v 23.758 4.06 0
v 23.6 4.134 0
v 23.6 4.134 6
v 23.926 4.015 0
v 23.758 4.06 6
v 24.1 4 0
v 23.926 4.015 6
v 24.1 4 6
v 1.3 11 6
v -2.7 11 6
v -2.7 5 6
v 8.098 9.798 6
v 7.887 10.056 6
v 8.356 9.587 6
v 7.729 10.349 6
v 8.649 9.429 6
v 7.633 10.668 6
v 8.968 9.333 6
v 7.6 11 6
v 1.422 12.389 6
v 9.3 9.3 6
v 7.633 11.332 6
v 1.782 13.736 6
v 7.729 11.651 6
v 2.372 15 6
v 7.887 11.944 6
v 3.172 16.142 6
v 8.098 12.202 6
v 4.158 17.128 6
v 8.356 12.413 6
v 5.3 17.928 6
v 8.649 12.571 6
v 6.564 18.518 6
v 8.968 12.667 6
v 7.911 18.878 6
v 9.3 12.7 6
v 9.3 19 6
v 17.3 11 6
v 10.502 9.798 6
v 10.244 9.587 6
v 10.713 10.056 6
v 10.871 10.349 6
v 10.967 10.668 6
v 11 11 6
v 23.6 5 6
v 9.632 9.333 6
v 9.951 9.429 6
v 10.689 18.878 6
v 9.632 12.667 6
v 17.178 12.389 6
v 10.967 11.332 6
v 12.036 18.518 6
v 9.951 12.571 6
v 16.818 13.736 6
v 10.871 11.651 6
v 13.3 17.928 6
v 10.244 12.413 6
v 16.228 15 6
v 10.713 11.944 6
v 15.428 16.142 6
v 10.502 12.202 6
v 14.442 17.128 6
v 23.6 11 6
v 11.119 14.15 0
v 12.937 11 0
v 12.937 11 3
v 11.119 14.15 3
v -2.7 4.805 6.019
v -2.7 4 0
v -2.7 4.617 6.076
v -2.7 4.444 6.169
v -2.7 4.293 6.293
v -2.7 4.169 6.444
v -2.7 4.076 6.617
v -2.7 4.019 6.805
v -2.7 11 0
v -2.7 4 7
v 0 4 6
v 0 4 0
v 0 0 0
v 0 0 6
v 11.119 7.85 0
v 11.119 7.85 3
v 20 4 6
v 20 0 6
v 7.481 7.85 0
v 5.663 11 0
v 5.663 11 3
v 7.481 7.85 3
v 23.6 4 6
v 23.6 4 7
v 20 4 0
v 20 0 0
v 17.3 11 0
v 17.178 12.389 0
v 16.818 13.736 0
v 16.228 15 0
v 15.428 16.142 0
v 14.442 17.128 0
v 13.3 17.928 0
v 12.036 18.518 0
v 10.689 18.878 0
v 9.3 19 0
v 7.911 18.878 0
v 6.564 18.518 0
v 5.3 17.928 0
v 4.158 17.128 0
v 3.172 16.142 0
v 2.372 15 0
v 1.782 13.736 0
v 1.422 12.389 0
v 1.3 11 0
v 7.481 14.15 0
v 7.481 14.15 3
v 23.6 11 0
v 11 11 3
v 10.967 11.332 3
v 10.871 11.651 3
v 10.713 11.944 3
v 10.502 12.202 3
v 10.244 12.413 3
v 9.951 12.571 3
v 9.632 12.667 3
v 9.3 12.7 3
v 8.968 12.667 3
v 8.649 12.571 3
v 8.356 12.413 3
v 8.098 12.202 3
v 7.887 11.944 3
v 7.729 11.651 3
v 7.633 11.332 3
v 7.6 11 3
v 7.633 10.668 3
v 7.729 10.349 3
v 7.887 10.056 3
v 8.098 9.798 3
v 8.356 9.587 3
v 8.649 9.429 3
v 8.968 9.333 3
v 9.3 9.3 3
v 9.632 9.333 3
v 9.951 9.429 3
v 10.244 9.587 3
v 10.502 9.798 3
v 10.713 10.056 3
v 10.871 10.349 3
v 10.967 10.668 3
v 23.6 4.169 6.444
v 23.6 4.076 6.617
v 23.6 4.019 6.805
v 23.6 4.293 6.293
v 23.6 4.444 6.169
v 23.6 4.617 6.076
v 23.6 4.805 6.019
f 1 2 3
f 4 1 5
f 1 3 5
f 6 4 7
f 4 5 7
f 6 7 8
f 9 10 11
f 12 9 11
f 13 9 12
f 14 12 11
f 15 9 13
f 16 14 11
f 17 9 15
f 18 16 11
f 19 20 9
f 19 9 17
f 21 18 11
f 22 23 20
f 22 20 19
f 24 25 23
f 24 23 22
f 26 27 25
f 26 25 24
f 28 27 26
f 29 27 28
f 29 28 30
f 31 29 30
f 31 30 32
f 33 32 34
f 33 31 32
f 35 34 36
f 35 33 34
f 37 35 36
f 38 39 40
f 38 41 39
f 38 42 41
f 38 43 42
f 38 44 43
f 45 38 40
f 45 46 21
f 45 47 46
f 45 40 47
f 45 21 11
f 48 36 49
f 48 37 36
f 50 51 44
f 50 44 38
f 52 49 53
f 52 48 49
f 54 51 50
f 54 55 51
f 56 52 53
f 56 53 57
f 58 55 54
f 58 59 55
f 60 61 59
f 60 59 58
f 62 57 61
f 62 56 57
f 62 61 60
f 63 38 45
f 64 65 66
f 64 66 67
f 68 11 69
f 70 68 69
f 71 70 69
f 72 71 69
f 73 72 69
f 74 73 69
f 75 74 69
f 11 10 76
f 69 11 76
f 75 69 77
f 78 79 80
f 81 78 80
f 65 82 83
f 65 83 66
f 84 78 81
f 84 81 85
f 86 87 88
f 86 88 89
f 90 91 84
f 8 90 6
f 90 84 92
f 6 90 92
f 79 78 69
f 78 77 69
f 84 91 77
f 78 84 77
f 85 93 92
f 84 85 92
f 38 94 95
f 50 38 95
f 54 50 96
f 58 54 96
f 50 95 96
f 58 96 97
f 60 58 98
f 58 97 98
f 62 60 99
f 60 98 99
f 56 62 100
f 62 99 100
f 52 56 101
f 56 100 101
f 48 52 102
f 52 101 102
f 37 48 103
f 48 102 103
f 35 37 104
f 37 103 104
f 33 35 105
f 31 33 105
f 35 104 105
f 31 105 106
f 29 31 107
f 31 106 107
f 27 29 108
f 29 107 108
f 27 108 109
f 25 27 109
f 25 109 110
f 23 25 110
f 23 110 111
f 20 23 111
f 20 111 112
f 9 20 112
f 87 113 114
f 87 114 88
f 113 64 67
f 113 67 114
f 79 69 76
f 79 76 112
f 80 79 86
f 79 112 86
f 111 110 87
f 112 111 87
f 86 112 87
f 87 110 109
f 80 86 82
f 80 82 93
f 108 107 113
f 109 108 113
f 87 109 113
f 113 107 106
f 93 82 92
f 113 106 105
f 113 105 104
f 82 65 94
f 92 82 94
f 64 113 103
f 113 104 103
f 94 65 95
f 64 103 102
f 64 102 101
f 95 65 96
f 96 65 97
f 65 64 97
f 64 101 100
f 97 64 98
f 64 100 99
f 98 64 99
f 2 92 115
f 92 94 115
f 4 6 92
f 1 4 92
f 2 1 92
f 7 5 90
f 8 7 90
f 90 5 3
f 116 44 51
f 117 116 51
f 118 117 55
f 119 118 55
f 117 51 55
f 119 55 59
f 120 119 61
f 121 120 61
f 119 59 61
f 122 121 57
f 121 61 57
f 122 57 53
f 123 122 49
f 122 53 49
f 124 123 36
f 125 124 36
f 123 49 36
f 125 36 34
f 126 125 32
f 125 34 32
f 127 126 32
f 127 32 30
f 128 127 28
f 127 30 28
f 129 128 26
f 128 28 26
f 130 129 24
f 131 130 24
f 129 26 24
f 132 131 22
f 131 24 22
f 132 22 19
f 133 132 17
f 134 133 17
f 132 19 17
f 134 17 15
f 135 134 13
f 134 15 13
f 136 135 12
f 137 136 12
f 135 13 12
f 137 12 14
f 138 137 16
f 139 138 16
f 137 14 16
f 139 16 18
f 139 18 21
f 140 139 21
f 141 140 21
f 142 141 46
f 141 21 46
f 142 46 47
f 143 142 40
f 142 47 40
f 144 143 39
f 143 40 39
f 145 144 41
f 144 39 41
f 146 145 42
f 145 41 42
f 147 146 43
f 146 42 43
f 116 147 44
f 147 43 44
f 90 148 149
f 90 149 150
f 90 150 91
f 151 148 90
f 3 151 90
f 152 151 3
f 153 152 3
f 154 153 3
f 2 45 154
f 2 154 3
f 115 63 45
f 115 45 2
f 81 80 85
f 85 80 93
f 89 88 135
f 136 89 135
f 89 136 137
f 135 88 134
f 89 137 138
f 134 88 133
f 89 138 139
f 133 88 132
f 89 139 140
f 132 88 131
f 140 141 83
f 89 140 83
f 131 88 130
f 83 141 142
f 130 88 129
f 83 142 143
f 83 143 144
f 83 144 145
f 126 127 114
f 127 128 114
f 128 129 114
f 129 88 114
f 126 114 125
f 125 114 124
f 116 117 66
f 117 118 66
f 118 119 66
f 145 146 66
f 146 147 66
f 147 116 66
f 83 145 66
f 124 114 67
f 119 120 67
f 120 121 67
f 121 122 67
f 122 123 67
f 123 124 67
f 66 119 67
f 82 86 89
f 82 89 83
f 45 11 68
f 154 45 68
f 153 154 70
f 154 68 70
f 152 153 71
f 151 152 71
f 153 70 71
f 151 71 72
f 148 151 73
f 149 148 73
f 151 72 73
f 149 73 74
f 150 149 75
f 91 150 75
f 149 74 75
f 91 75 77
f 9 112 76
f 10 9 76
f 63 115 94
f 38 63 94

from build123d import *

# Parameters (mm, degrees)
BOSS_EXTRUDE1_DEPTH = 6
BOSS_EXTRUDE2_DEPTH = 26.3
BOSS_EXTRUDE3_DEPTH = 6
SKETCH8_R           = 1.7
BOSS_EXTRUDE4_DEPTH = 3


with BuildPart() as part:
    # Sketch1 → Boss-Extrude1 (new body)
    with BuildSketch(Plane.XY):
        with BuildLine():
            Line((0, 0), (20, 0))
            Line((20, 0), (20, 4))
            Line((20, 4), (23.6, 4))
            Line((23.6, 4), (23.6, 11))
            Line((23.6, 11), (17.3, 11))
            ThreePointArc((17.3, 11), (9.3, 19), (1.3, 11))
            Line((1.3, 11), (-2.7, 11))
            Line((-2.7, 11), (-2.7, 4))
            Line((-2.7, 4), (0, 4))
            Line((0, 4), (0, 0))
        make_face()
        Polygon((11.118653348, 14.15), (7.481346652, 14.15), (5.662693304, 11), (7.481346652, 7.85), (11.118653348, 7.85), (12.937306696, 11), align=None, mode=Mode.SUBTRACT)
    extrude(amount=BOSS_EXTRUDE1_DEPTH)

    # Sketch2 → Boss-Extrude2 (add)
    with BuildSketch(Plane.ZY.offset(2.7)):
        with BuildLine():
            Line((6, 4), (6, 5))
            ThreePointArc((6, 5), (6.292893219, 4.292893219), (7, 4))
            Line((7, 4), (6, 4))
        make_face()
    extrude(amount=-BOSS_EXTRUDE2_DEPTH)

    # Sketch4 → Boss-Extrude3 (add)
    with BuildSketch(Plane.XY.offset(6)):
        with BuildLine():
            Line((23.1, 4), (23.1, 5))
            ThreePointArc((23.1, 5), (23.392893219, 4.292893219), (24.1, 4))
            Line((24.1, 4), (23.1, 4))
        make_face()
        with BuildLine():
            Line((-1.5, 4), (-2.5, 4))
            ThreePointArc((-2.5, 4), (-1.792893219, 4.292893219), (-1.5, 5))
            Line((-1.5, 5), (-1.5, 4))
        make_face()
    extrude(amount=-BOSS_EXTRUDE3_DEPTH)

    # Sketch8 → Boss-Extrude4 (add)
    with BuildSketch(Plane.XY.offset(6)):
        Polygon((7.452479139, 14.2), (5.604958277, 11), (7.452479139, 7.8), (11.147520861, 7.8), (12.995041723, 11), (11.147520861, 14.2), align=None)
        with Locations((9.3, 11)):
            Circle(SKETCH8_R, mode=Mode.SUBTRACT)
    extrude(amount=-BOSS_EXTRUDE4_DEPTH)


solid = part.part
